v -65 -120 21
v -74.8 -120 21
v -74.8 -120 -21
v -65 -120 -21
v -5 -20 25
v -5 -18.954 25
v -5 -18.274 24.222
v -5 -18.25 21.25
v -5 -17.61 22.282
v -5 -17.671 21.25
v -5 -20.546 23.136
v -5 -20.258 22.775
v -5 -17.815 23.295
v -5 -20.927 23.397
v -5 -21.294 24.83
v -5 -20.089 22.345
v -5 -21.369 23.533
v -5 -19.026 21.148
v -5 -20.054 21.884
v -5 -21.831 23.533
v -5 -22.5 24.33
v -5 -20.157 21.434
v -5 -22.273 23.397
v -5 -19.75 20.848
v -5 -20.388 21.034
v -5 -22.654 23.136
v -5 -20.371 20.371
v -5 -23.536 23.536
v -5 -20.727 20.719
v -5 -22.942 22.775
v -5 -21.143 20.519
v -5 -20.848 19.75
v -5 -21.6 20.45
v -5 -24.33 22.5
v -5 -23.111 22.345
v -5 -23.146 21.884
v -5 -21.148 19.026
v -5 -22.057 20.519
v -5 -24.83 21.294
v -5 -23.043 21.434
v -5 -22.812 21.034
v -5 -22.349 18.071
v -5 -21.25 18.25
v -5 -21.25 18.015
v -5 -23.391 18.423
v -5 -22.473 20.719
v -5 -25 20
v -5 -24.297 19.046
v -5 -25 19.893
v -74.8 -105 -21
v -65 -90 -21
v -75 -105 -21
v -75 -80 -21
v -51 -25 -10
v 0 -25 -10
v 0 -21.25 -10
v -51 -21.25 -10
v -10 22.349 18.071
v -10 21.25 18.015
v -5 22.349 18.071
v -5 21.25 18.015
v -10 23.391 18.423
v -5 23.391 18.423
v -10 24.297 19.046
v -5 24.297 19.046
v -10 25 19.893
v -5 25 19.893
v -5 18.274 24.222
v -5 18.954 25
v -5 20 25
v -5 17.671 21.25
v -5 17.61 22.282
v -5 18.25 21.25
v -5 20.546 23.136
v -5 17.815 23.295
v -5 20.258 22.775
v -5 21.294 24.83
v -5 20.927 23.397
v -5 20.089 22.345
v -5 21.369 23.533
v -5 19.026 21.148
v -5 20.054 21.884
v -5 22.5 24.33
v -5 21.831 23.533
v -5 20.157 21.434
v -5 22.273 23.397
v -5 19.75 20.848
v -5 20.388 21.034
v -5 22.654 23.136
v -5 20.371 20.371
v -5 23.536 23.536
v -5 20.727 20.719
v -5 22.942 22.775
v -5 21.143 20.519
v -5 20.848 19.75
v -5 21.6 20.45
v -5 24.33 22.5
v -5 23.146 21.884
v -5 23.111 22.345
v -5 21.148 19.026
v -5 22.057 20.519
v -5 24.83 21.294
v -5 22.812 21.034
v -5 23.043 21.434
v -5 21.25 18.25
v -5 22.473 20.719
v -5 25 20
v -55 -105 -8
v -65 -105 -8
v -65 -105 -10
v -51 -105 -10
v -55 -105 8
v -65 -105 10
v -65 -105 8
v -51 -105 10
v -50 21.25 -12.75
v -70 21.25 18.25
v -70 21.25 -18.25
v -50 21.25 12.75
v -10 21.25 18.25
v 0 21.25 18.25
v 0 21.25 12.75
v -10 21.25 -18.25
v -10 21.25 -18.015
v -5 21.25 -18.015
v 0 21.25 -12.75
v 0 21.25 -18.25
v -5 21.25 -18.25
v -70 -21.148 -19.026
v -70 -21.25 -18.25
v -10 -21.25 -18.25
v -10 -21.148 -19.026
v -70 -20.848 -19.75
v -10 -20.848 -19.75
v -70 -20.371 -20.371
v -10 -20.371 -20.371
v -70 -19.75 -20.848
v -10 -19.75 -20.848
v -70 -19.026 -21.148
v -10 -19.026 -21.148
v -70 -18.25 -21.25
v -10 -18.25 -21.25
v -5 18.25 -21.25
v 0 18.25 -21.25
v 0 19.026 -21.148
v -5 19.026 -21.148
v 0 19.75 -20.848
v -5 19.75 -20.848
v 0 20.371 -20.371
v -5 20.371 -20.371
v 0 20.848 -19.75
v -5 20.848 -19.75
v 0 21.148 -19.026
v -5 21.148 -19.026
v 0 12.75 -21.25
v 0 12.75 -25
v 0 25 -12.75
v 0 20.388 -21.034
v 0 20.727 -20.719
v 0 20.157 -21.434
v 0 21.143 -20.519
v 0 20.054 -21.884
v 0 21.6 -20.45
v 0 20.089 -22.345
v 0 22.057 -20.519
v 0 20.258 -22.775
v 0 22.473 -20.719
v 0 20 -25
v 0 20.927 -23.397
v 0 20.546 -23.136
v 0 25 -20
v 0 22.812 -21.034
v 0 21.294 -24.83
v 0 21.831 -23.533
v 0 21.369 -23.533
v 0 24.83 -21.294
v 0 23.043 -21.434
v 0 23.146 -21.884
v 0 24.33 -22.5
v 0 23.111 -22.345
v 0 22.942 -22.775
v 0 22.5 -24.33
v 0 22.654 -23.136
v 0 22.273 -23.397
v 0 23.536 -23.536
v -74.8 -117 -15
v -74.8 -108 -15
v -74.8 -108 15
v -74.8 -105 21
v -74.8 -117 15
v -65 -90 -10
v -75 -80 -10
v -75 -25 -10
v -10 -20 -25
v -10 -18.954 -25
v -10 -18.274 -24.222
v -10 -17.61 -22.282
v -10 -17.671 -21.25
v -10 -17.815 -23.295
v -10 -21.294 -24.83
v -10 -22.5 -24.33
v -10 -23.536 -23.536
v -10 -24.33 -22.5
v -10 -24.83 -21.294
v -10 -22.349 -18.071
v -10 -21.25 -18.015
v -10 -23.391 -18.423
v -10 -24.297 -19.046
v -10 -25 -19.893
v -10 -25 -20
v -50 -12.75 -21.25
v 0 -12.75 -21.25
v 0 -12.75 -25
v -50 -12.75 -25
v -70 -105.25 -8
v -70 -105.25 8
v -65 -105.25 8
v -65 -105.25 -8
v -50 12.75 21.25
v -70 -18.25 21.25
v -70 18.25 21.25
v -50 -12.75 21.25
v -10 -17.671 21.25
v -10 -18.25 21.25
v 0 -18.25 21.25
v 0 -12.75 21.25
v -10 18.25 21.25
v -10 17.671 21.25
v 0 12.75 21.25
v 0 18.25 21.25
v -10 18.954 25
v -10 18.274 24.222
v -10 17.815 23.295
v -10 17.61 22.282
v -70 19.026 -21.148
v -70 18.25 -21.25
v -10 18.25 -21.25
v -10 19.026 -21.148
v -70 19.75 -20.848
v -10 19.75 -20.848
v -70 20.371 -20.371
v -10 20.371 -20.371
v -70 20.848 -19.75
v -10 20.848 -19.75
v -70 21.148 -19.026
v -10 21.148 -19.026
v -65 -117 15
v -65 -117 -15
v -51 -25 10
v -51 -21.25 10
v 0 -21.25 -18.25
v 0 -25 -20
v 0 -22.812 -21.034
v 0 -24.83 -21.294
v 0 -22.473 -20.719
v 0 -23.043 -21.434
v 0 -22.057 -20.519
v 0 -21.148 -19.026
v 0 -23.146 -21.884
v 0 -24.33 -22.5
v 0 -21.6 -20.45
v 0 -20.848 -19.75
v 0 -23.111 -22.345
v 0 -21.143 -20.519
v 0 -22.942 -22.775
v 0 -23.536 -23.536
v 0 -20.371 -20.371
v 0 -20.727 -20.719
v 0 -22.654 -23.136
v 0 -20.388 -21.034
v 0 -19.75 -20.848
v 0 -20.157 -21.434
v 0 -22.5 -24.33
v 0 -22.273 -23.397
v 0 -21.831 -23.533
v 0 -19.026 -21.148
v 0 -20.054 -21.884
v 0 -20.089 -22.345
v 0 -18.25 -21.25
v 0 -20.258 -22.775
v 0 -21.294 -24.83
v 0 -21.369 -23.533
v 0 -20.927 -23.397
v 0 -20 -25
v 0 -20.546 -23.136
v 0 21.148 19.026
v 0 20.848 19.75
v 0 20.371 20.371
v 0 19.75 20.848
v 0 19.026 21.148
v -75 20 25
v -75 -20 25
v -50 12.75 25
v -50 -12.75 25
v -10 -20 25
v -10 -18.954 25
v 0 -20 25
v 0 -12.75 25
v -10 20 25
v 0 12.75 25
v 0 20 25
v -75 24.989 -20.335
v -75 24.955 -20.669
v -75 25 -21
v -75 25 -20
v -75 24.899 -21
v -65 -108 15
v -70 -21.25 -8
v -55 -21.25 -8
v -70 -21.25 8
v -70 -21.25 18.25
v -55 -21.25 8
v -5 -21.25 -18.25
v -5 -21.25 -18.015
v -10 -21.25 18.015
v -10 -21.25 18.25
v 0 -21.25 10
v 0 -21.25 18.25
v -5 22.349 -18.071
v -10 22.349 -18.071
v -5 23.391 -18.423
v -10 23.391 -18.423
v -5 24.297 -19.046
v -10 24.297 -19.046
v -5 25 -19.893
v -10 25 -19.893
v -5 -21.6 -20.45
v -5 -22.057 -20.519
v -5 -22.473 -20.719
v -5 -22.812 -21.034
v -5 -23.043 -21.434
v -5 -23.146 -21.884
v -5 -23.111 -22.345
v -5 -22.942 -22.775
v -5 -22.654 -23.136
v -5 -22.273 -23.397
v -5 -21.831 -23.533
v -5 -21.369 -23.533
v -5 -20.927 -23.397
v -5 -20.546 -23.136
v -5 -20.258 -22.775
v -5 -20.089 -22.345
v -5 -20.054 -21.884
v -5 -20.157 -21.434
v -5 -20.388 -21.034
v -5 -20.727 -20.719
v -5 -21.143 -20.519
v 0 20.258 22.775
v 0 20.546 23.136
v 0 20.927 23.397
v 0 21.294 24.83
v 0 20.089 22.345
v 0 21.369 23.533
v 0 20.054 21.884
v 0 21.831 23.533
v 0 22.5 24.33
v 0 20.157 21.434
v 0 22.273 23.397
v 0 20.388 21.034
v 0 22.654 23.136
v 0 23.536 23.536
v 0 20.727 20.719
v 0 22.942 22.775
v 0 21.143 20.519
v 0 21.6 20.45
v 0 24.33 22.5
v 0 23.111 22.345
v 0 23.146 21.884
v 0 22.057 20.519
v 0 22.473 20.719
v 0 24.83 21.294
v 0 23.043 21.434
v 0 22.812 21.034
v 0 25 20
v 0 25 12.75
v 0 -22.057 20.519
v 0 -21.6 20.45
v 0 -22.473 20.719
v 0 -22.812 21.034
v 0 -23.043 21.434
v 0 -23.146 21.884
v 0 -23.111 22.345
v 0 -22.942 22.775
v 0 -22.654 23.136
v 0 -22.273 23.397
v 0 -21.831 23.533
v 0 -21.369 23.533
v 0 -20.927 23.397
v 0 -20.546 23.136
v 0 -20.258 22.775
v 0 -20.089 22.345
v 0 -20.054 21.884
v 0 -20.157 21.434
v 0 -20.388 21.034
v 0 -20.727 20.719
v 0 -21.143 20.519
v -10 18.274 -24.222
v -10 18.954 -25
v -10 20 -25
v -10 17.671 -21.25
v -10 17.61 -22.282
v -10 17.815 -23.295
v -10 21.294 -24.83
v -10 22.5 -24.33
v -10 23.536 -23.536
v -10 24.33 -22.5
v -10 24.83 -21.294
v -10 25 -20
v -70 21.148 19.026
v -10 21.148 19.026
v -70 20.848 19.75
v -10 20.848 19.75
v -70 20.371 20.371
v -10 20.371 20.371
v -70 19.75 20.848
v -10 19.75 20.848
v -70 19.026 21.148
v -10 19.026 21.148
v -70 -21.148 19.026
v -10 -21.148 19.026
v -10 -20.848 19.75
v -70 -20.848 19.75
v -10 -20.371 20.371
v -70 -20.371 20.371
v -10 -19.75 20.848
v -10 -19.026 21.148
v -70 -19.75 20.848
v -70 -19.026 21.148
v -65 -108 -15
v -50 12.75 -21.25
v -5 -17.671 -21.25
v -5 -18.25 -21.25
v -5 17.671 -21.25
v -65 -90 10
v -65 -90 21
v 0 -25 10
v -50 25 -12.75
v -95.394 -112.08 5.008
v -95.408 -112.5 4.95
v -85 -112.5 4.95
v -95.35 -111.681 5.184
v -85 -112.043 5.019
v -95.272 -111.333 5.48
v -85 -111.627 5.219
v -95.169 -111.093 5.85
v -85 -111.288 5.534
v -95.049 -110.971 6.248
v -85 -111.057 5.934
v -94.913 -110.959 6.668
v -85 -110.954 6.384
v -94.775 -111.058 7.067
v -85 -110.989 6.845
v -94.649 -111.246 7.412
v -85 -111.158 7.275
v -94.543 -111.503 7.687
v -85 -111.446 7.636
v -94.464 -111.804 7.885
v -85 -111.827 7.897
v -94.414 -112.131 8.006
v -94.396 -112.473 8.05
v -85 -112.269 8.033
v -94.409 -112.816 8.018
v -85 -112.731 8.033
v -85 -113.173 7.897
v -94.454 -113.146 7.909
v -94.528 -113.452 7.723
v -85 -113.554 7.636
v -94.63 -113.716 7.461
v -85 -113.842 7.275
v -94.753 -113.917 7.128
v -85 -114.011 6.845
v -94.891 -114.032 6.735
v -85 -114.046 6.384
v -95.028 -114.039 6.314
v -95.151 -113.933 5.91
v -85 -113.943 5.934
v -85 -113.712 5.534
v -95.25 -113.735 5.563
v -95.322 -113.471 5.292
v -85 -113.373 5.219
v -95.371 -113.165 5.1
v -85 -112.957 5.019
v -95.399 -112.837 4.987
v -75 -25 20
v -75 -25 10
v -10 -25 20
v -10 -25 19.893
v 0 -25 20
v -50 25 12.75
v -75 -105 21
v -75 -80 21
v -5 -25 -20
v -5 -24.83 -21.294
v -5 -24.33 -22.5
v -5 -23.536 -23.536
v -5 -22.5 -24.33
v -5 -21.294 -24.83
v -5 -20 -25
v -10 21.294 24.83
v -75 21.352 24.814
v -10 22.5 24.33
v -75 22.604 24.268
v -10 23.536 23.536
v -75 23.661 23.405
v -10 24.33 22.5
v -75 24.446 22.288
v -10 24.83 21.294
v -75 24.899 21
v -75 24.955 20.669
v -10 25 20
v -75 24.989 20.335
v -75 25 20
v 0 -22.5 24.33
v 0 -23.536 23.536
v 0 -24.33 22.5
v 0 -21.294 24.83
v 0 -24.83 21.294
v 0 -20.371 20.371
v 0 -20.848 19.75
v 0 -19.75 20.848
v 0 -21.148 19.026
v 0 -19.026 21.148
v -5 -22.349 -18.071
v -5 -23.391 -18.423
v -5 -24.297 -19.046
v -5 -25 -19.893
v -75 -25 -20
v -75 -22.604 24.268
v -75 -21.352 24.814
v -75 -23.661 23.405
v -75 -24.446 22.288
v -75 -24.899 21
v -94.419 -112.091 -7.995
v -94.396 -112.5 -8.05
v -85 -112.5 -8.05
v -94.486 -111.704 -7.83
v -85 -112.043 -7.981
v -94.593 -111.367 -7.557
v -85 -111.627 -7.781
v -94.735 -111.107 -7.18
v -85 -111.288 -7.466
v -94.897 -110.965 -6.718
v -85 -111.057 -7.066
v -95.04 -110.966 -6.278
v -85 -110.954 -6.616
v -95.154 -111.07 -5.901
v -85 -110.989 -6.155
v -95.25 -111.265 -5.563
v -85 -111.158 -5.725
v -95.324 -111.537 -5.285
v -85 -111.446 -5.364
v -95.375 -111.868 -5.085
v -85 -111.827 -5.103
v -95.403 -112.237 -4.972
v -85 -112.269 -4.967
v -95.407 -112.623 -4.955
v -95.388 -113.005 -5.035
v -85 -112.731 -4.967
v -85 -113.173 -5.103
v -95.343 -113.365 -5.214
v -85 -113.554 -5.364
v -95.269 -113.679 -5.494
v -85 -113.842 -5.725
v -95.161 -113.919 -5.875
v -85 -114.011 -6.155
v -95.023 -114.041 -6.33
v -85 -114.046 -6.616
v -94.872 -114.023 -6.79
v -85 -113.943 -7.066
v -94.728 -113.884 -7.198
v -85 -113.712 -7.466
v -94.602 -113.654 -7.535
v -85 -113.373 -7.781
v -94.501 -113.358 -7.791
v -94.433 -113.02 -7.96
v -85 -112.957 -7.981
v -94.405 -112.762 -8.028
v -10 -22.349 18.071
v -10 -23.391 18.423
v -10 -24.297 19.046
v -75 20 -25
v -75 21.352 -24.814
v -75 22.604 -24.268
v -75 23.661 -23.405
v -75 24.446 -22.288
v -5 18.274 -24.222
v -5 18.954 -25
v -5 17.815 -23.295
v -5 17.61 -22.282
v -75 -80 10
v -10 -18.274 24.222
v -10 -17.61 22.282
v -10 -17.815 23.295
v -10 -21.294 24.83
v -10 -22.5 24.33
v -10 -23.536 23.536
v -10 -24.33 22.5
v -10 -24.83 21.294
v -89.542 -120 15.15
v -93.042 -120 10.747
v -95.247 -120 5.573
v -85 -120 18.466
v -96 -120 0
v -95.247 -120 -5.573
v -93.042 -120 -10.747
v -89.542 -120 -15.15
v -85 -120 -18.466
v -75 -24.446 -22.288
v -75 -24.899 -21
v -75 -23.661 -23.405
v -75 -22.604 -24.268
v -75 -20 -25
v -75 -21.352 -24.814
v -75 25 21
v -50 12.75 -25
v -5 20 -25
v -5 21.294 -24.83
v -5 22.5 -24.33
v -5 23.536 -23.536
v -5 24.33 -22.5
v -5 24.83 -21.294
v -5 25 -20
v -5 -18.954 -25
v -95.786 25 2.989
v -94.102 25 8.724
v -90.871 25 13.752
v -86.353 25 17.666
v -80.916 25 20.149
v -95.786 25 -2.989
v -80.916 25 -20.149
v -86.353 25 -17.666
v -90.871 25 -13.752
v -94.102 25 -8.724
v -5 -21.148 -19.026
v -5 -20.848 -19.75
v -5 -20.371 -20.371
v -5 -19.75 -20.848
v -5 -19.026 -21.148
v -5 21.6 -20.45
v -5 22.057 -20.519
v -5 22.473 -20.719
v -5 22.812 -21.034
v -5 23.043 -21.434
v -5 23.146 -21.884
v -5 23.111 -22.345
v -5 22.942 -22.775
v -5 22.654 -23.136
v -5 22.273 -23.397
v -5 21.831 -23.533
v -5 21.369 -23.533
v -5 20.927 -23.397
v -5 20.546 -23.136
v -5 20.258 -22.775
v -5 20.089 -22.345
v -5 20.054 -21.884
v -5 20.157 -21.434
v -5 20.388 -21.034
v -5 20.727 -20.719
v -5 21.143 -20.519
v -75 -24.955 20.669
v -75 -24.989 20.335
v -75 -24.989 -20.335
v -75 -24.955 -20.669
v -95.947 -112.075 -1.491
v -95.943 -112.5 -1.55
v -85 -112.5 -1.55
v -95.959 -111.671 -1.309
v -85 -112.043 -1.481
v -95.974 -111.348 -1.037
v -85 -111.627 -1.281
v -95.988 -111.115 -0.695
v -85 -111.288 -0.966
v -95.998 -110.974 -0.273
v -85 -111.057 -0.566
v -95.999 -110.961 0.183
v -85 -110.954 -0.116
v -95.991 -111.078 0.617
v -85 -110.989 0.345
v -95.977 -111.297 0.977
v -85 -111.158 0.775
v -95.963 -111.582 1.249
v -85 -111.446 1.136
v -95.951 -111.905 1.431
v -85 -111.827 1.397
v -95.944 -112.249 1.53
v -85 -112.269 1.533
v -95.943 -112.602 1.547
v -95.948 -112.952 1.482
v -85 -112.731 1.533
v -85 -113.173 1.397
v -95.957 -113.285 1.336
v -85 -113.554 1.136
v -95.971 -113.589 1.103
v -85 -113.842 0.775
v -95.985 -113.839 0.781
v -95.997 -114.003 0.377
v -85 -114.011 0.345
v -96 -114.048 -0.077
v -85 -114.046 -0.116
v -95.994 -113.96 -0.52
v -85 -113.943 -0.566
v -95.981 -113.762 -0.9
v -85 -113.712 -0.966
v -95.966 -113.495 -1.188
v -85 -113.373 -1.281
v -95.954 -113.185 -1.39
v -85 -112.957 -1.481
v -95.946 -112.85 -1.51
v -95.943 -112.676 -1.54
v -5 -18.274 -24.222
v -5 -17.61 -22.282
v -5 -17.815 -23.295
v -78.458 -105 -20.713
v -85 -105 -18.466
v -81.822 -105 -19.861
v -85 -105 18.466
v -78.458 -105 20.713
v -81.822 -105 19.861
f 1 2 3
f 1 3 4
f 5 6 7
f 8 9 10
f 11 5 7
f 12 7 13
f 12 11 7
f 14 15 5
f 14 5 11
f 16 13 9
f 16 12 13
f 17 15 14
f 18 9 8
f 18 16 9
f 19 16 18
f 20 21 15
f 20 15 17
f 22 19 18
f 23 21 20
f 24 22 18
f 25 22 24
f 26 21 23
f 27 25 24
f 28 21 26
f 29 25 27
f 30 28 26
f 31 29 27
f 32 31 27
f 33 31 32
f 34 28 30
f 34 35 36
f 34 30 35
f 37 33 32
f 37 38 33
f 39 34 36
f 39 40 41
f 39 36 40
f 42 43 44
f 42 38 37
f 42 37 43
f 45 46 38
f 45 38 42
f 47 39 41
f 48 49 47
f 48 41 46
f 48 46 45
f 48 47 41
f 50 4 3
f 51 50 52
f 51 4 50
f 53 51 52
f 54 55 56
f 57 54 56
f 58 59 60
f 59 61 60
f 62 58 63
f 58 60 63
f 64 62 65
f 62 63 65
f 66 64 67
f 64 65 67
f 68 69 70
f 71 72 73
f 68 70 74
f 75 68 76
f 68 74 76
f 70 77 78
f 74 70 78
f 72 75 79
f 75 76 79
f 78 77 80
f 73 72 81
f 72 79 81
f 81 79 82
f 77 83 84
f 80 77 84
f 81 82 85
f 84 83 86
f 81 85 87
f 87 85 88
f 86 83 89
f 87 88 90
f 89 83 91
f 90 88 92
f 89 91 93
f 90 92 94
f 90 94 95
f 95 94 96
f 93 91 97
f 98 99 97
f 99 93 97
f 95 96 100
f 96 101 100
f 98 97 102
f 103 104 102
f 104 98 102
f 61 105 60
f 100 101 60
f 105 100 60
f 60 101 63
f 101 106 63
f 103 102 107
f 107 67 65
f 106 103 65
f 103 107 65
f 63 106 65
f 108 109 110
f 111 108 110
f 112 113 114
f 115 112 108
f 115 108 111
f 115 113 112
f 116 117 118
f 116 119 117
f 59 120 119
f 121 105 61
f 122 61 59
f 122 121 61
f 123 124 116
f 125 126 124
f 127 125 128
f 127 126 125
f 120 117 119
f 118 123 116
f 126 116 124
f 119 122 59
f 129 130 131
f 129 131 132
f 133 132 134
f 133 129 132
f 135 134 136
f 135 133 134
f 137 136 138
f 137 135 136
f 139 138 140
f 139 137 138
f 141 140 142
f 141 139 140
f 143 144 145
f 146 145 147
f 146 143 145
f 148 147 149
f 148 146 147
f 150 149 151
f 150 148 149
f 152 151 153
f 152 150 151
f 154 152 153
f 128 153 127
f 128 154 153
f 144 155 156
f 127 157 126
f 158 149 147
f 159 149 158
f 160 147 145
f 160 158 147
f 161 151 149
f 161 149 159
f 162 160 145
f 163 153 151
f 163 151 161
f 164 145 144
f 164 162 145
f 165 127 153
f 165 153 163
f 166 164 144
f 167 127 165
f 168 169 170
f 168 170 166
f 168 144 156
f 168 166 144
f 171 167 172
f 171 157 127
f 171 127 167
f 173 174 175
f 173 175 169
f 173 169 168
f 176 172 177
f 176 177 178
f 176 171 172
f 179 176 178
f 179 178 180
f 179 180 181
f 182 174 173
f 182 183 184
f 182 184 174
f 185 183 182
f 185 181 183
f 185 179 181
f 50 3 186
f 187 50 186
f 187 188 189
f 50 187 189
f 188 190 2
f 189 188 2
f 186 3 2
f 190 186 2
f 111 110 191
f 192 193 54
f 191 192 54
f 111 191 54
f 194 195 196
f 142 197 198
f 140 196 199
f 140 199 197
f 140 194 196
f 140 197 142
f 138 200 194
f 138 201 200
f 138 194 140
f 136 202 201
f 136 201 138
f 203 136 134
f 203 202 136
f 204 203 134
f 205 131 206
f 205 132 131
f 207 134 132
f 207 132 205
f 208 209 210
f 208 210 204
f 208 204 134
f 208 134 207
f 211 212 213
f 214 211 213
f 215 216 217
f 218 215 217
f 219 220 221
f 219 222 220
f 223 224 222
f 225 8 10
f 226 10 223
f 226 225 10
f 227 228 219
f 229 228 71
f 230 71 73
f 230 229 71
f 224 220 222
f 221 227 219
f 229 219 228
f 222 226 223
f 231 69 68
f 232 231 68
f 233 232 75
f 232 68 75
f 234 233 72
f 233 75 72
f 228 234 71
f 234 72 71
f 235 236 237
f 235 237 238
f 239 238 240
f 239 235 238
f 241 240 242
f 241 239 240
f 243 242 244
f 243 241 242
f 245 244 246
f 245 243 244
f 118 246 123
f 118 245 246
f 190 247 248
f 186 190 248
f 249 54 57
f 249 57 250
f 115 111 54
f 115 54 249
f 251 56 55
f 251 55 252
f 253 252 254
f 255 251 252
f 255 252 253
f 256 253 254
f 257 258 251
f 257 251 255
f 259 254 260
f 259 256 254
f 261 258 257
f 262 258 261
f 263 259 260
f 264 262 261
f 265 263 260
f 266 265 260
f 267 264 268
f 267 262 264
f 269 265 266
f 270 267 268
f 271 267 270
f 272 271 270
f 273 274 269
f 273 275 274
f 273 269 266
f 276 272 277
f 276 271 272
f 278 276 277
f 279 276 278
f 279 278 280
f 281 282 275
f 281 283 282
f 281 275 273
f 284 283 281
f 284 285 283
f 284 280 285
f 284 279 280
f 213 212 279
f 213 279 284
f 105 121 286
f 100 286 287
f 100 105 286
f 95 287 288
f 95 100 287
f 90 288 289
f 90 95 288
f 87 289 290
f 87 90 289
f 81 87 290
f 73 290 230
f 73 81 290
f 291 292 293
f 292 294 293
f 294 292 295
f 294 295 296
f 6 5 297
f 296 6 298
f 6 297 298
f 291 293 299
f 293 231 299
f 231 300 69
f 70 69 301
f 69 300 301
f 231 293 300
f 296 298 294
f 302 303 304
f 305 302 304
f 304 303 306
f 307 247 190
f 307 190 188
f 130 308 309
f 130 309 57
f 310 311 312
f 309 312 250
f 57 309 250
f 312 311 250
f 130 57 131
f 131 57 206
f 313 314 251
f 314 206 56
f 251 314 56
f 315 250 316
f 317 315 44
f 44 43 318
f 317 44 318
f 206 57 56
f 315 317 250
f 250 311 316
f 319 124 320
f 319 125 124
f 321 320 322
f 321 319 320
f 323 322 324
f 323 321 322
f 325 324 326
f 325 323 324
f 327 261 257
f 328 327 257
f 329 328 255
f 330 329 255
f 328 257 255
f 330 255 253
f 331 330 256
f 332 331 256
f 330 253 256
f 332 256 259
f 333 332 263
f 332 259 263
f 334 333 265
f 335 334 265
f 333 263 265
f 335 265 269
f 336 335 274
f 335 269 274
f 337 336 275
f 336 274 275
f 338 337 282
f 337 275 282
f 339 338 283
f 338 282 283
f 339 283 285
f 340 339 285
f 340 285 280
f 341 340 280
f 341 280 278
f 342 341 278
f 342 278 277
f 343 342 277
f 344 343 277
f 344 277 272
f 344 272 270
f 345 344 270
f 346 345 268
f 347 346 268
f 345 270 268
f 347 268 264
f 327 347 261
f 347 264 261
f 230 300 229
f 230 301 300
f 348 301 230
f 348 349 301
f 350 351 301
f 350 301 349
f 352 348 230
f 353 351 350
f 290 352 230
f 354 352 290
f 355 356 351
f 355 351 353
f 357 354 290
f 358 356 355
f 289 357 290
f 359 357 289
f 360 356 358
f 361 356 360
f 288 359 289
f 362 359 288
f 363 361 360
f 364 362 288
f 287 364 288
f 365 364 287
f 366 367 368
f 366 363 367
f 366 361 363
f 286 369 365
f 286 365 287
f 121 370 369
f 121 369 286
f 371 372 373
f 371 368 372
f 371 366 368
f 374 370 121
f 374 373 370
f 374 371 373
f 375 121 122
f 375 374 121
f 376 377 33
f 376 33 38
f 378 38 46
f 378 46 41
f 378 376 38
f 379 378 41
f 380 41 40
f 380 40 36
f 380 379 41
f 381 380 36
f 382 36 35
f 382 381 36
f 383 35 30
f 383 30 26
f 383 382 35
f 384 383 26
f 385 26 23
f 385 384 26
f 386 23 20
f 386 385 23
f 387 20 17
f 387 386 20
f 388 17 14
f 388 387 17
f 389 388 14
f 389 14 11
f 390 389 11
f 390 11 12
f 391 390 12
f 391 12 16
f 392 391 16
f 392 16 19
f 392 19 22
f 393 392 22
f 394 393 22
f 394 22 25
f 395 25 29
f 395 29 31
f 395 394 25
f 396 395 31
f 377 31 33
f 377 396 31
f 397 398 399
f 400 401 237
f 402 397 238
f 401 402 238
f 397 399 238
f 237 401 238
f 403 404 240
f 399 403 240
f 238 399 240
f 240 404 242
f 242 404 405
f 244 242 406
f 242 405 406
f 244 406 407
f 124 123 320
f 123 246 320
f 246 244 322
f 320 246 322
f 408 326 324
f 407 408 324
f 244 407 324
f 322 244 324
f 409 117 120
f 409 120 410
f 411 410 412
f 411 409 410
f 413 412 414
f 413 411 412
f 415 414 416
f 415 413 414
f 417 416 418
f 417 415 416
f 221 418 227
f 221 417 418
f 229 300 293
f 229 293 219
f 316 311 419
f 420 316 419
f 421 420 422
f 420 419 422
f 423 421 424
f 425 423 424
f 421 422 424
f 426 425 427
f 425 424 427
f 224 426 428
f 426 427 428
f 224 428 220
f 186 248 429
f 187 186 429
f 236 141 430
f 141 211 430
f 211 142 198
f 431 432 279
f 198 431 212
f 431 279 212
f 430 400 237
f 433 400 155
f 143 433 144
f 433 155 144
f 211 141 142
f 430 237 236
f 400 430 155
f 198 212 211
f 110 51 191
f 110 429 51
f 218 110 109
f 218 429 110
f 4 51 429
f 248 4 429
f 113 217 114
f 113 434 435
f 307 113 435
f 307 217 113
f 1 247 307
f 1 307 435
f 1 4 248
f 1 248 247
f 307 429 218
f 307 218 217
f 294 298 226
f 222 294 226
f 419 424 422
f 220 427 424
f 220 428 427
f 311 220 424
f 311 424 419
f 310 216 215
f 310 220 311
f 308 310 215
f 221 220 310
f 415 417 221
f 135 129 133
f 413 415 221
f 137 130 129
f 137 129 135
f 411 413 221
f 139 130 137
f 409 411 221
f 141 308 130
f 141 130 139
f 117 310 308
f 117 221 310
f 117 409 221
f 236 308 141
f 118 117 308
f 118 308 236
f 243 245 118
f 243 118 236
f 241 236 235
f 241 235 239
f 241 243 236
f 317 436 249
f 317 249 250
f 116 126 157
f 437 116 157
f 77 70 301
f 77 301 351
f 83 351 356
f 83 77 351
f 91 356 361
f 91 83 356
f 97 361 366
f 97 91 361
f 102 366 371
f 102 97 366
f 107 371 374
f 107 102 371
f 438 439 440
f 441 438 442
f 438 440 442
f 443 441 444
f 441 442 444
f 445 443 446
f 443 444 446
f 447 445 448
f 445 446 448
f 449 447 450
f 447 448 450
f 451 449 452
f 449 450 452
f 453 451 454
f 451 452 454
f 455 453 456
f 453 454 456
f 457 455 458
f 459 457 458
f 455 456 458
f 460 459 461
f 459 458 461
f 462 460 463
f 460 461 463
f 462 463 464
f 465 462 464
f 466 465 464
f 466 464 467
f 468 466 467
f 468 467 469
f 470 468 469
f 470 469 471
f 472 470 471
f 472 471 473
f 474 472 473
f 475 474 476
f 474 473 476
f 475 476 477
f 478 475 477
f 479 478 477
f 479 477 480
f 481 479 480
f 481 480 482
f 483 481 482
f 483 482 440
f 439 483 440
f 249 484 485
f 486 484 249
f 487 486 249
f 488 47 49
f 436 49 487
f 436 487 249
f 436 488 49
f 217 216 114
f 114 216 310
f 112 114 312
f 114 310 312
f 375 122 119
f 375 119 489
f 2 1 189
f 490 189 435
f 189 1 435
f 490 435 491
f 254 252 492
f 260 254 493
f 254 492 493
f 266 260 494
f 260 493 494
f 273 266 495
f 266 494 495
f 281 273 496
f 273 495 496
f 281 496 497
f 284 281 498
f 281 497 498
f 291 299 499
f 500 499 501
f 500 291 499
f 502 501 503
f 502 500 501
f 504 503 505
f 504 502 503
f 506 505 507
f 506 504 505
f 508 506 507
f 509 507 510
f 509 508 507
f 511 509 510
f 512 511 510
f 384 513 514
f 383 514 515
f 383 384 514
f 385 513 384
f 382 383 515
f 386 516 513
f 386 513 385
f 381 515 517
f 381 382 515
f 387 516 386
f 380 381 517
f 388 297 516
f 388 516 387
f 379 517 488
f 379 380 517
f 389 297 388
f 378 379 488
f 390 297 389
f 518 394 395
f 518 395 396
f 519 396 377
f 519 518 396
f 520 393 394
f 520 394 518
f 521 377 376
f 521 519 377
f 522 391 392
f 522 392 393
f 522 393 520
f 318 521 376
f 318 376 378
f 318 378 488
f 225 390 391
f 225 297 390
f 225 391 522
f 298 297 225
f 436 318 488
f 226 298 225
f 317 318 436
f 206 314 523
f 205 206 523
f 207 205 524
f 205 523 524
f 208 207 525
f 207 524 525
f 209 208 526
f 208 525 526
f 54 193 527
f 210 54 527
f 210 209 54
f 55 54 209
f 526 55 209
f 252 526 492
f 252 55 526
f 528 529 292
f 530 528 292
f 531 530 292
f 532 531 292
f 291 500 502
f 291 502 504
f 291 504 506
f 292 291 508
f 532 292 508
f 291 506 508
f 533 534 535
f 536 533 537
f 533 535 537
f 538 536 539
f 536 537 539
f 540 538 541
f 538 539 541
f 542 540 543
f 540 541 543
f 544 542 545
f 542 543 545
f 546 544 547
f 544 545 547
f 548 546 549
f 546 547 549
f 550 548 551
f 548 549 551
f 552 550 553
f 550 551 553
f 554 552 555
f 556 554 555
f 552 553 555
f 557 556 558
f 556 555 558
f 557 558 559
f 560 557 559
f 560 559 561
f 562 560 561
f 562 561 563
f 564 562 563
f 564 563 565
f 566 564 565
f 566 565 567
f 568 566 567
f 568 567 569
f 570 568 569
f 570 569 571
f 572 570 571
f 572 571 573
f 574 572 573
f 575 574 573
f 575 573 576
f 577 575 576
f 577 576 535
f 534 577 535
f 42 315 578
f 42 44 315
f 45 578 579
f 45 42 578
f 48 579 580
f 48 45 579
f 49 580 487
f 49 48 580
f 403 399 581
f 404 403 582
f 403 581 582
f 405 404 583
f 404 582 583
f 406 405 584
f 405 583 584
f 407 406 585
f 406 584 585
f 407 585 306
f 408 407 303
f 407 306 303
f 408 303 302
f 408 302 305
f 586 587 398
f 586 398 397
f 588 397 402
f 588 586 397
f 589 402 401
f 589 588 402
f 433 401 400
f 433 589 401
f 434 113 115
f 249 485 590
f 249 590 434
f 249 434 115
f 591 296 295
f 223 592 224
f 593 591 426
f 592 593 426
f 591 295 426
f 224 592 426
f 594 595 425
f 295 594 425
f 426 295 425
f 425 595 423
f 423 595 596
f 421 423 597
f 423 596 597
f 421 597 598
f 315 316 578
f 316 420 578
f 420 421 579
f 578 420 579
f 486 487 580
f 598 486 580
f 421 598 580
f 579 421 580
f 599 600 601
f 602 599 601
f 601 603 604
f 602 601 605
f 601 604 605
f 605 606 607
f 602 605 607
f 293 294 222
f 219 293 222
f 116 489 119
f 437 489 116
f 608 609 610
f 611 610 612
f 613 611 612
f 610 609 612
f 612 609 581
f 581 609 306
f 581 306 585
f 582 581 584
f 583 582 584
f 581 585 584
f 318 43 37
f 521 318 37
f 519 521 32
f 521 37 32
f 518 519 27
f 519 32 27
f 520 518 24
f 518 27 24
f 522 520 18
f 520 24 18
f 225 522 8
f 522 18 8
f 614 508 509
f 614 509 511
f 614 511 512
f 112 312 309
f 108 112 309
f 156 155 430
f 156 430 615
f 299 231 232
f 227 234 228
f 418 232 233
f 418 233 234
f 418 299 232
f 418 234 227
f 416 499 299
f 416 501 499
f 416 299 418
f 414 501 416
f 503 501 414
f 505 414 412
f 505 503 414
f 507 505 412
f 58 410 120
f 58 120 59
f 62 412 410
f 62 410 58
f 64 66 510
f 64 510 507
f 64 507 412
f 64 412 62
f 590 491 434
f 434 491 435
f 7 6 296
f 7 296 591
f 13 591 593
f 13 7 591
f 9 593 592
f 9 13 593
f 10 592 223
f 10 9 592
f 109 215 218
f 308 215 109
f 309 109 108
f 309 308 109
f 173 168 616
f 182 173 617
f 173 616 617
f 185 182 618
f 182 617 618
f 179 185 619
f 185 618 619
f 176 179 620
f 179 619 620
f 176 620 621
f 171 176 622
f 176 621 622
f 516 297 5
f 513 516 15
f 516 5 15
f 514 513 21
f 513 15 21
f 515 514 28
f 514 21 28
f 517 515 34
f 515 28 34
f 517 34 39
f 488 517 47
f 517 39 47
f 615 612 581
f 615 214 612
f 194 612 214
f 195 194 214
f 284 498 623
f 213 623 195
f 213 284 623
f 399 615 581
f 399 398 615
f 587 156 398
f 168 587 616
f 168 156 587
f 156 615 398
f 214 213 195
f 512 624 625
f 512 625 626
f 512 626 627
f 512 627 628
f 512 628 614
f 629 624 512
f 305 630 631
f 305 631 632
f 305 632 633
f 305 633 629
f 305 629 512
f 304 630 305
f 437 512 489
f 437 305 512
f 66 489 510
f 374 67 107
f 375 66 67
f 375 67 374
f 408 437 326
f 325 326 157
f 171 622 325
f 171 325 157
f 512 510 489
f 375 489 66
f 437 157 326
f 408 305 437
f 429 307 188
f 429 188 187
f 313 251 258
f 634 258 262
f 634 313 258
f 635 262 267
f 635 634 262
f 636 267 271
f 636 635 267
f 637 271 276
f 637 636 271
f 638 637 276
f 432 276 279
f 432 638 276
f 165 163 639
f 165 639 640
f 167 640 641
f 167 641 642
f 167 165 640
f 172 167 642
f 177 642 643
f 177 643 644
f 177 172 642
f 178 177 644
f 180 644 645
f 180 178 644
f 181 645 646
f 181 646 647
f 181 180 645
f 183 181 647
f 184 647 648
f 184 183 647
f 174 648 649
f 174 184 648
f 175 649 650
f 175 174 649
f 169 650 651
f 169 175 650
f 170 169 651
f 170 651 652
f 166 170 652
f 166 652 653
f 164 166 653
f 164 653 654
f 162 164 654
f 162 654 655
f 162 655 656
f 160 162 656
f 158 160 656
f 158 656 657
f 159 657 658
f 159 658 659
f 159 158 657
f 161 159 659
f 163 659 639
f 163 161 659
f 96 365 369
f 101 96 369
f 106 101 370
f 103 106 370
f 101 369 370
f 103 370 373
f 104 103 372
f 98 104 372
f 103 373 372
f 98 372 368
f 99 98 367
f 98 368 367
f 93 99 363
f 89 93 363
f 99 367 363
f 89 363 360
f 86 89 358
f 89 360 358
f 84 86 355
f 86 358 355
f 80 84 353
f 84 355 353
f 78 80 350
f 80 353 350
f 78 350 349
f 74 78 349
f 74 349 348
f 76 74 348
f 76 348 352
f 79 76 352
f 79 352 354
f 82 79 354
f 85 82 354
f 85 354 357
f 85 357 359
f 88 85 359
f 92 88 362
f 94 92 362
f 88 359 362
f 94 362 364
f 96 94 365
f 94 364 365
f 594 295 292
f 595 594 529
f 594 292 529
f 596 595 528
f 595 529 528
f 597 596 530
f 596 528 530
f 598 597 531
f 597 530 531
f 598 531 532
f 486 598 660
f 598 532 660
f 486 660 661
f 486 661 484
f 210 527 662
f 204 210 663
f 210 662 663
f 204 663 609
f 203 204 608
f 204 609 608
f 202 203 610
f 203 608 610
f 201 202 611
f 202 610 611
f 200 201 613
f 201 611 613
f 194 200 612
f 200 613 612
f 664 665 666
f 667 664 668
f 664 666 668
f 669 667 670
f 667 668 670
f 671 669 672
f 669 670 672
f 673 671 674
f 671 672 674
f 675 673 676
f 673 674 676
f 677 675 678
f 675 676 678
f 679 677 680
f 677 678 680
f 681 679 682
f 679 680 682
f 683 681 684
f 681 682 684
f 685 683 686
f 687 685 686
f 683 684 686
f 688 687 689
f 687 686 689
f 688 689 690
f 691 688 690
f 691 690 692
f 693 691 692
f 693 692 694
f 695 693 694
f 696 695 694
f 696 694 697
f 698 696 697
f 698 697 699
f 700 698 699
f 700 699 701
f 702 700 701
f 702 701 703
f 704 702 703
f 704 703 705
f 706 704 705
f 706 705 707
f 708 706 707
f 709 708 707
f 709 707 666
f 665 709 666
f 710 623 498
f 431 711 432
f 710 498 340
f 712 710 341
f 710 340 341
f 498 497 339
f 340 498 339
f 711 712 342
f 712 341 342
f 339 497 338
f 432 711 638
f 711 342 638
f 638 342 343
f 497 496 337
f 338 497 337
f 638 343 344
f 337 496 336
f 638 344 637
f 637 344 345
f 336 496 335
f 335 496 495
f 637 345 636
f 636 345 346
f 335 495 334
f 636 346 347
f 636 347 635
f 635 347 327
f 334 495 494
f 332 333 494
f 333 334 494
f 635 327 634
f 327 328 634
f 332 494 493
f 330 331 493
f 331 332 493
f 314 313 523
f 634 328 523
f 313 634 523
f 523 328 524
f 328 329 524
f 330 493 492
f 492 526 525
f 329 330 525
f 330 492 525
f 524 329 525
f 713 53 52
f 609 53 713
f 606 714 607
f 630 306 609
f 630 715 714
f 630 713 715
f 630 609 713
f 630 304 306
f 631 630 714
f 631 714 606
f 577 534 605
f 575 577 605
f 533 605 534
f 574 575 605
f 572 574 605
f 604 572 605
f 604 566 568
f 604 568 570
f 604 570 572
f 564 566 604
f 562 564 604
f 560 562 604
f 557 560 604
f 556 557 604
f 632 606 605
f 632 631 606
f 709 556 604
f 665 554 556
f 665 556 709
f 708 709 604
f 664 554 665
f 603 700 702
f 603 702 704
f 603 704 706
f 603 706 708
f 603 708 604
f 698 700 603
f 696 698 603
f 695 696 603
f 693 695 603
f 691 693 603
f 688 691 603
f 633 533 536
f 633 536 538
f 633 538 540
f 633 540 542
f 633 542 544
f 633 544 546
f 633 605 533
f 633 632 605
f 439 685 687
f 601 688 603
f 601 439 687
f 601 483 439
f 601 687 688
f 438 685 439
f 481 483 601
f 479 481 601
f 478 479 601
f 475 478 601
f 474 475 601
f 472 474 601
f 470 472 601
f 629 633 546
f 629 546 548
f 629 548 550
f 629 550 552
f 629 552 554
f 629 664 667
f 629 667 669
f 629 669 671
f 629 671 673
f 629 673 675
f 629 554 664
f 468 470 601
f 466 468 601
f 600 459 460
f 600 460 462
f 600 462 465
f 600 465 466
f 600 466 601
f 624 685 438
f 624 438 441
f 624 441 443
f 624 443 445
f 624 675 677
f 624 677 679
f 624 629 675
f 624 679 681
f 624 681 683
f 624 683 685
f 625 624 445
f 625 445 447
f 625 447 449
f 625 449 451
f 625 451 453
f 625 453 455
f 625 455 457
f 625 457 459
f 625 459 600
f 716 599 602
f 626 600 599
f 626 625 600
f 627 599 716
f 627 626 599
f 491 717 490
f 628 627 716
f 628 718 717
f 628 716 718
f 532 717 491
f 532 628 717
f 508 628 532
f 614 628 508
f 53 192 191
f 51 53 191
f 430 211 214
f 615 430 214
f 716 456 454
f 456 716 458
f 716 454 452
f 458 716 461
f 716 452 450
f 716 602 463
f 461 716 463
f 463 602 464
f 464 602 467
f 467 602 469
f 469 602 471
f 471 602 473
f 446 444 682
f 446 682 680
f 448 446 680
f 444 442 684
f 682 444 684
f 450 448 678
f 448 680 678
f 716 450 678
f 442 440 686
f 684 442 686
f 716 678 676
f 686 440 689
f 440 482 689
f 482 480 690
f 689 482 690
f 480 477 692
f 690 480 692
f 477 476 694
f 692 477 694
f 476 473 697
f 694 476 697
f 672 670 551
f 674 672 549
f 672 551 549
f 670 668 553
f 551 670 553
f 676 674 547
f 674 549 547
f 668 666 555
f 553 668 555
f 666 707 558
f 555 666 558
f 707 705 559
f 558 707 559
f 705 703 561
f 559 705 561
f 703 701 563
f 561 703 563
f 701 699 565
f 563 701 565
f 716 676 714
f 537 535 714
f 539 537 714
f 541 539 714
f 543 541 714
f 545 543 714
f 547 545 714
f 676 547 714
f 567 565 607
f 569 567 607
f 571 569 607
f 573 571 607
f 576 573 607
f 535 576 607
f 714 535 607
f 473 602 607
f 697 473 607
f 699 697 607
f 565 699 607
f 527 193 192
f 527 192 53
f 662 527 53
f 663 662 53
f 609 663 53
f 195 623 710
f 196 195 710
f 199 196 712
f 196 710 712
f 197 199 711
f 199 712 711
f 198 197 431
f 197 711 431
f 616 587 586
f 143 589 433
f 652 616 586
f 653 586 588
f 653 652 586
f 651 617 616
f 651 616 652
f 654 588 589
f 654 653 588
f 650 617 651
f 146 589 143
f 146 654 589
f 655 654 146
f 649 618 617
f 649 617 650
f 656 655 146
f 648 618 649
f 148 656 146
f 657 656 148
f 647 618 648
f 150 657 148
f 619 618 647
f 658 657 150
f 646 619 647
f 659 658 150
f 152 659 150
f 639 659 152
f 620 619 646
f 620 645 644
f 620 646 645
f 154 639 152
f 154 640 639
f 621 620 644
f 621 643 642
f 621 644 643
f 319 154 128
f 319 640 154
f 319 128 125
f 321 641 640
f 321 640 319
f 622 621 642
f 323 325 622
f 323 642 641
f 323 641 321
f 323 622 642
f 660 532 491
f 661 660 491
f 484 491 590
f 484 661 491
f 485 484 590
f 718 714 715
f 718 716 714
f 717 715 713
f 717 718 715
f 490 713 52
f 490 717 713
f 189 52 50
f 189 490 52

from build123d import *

# Parameters (mm, degrees)
SKETCH1_W                = 50
SKETCH1_H                = 50
BOSS_EXTRUDE1_DEPTH      = 75
FILLET1_R                = 5
SKETCH2_W                = 42.5
SKETCH2_H                = 42.5
CUT_EXTRUDE1_DEPTH       = 70
FILLET2_R                = 3
SKETCH3_W                = 25.5
SKETCH3_H                = 3.75
SKETCH3_W_2              = 3.75
SKETCH3_H_2              = 25.5
CUT_EXTRUDE2_DEPTH       = 50
SKETCH4_W                = 20
SKETCH4_H                = 3.75
CUT_EXTRUDE3_DEPTH       = 70
SKETCH8_R                = 1.55
CUT_EXTRUDE5_DEPTH       = 5
SKETCH9_R                = 4
CUT_EXTRUDE6_DEPTH       = 5
MIRROR2_COPY_1_SKETCH_R  = 1.55
MIRROR2_COPY_1_DEPTH     = 5
MIRROR2_COPY_2_SKETCH_R  = 4
MIRROR2_COPY_2_DEPTH     = 5
BOSS_EXTRUDE2_DEPTH      = 25
BOSS_EXTRUDE2_DEPTH_BACK = 120
CUT_EXTRUDE8_DEPTH       = 15
SKETCH12_R               = 1.55
CUT_EXTRUDE9_DEPTH       = 15
SKETCH13_W               = 10
SKETCH13_H               = 42
BOSS_EXTRUDE3_DEPTH      = 15
BOSS_EXTRUDE3_DEPTH_BACK = 15
BOSS_EXTRUDE4_DEPTH      = 42
SKETCH16_W               = 30
SKETCH16_H               = 9
CUT_EXTRUDE10_DEPTH      = 10
SKETCH17_W               = 0.2
SKETCH17_H               = 42
CUT_EXTRUDE11_DEPTH      = 15
SKETCH18_W               = 24
SKETCH18_H               = 20
BOSS_EXTRUDE7_DEPTH      = 80
BOSS_EXTRUDE7_DEPTH_BACK = 3.75
SKETCH19_W               = 15
SKETCH19_H               = 16
CUT_EXTRUDE12_DEPTH      = 84


with BuildPart() as part:
    # Sketch1 → Boss-Extrude1 (new body)
    with BuildSketch(Plane(origin=(0, 0, 0), x_dir=(0, 0, -1), z_dir=(1, 0, 0))):
        Rectangle(SKETCH1_W, SKETCH1_H)
    extrude(amount=-BOSS_EXTRUDE1_DEPTH)

    # Fillet1
    fillet1_edges = [part.edges().sort_by_distance(p)[0] for p in [
        (-37.5, -25, -25),
        (-37.5, -25, 25),
        (-37.5, 25, 25),
        (-37.5, 25, -25),
    ]]
    fillet(fillet1_edges, radius=FILLET1_R)

    # Sketch2 → Cut-Extrude1 (cut)
    with BuildSketch(Plane(origin=(0, 0, 0), x_dir=(0, 0, -1), z_dir=(1, 0, 0))):
        Rectangle(SKETCH2_W, SKETCH2_H)
    extrude(amount=-CUT_EXTRUDE1_DEPTH, mode=Mode.SUBTRACT)

    # Fillet2
    fillet2_edges = [part.edges().sort_by_distance(p)[0] for p in [
        (-35, 21.25, -21.25),
        (-35, -21.25, -21.25),
        (-35, -21.25, 21.25),
        (-35, 21.25, 21.25),
    ]]
    fillet(fillet2_edges, radius=FILLET2_R)

    # Sketch3 → Cut-Extrude2 (cut)
    with BuildSketch(Plane(origin=(0, 0, 0), x_dir=(0, 0, -1), z_dir=(1, 0, 0))):
        with Locations((0, 23.125)):
            Rectangle(SKETCH3_W, SKETCH3_H)
        with Locations((-23.125, 0)):
            Rectangle(SKETCH3_W_2, SKETCH3_H_2)
        with Locations((23.125, 0)):
            Rectangle(SKETCH3_W_2, SKETCH3_H_2)
    extrude(amount=-CUT_EXTRUDE2_DEPTH, mode=Mode.SUBTRACT)

    # Sketch4 → Cut-Extrude3 (cut)
    with BuildSketch(Plane(origin=(0, 0, 0), x_dir=(0, 0, -1), z_dir=(1, 0, 0))):
        with Locations((0, -23.125)):
            Rectangle(SKETCH4_W, SKETCH4_H)
    extrude(amount=-CUT_EXTRUDE3_DEPTH, mode=Mode.SUBTRACT)

    # Sketch8 → Cut-Extrude5 (cut)
    with BuildSketch(Plane(origin=(0, 0, 0), x_dir=(0, 0, -1), z_dir=(1, 0, 0))):
        with Locations((-22, 21.6)):
            Circle(SKETCH8_R)
    cut_extrude5 = extrude(amount=-CUT_EXTRUDE5_DEPTH, mode=Mode.SUBTRACT)

    # Sketch9 → Cut-Extrude6 (cut)
    with BuildSketch(Plane(origin=(-5, 0, 0), x_dir=(0, 0, -1), z_dir=(1, 0, 0))):
        with Locations((-22, 21.6)):
            Circle(SKETCH9_R)
    cut_extrude6 = extrude(amount=-CUT_EXTRUDE6_DEPTH, mode=Mode.SUBTRACT)

    # Mirror1: Cut-Extrude5, Cut-Extrude6 across plane
    add(cut_extrude5.mirror(Plane.ZX), mode=Mode.SUBTRACT)
    add(cut_extrude6.mirror(Plane.ZX), mode=Mode.SUBTRACT)

    # Mirror2: Cut-Extrude5, Cut-Extrude6 across plane
    add(cut_extrude5.mirror(Plane.XY), mode=Mode.SUBTRACT)
    add(cut_extrude6.mirror(Plane.XY), mode=Mode.SUBTRACT)

    # Mirror2 copy 1 sketch → Mirror2 copy 1 (cut)
    with BuildSketch(Plane(origin=(0, 0, 0), x_dir=(0, 0, 1), z_dir=(1, 0, 0))):
        with Locations((-22, 21.6)):
            Circle(MIRROR2_COPY_1_SKETCH_R)
    extrude(amount=-MIRROR2_COPY_1_DEPTH, mode=Mode.SUBTRACT)

    # Mirror2 copy 2 sketch → Mirror2 copy 2 (cut)
    with BuildSketch(Plane(origin=(-5, 0, 0), x_dir=(0, 0, 1), z_dir=(1, 0, 0))):
        with Locations((-22, 21.6)):
            Circle(MIRROR2_COPY_2_SKETCH_R)
    extrude(amount=-MIRROR2_COPY_2_DEPTH, mode=Mode.SUBTRACT)

    # Sketch10 → Boss-Extrude2 (add, two sides)
    with BuildSketch(Plane(origin=(0, 0, 0), x_dir=(1, 0, 0), z_dir=(0, 1, 0))) as boss_extrude2_sk:
        with BuildLine():
            Line((-75, -21), (-75, 21))
            ThreePointArc((-75, 21), (-96, 0), (-75, -21))
        make_face()
    extrude(amount=BOSS_EXTRUDE2_DEPTH)
    extrude(boss_extrude2_sk.sketch, amount=-BOSS_EXTRUDE2_DEPTH_BACK)

    # Sketch11 → Cut-Extrude8 (cut)
    with BuildSketch(Plane.XZ.offset(120)):
        with BuildLine():
            Line((-85, 18.466185313), (-85, -18.466185313))
            ThreePointArc((-85, -18.466185313), (-80.158008745, -20.356692899), (-75, -21))
            Line((-75, -21), (-75, 21))
            ThreePointArc((-75, 21), (-80.158008745, 20.356692899), (-85, 18.466185313))
        make_face()
    extrude(amount=-CUT_EXTRUDE8_DEPTH, mode=Mode.SUBTRACT)

    # Sketch12 → Cut-Extrude9 (cut)
    with BuildSketch(Plane(origin=(-85, 0, 0), x_dir=(0, 0, -1), z_dir=(1, 0, 0))):
        with Locations((0, -112.5)):
            Circle(SKETCH12_R)
        with Locations((-6.5, -112.5)):
            Circle(SKETCH12_R)
        with Locations((6.5, -112.5)):
            Circle(SKETCH12_R)
    extrude(amount=-CUT_EXTRUDE9_DEPTH, mode=Mode.SUBTRACT)



with BuildPart() as body_2:
    # Sketch13 → Boss-Extrude3 (new body, two sides)
    with BuildSketch(Plane.XZ.offset(105)) as boss_extrude3_sk:
        with Locations((-70, 0)):
            Rectangle(SKETCH13_W, SKETCH13_H)
    extrude(amount=BOSS_EXTRUDE3_DEPTH)
    extrude(boss_extrude3_sk.sketch, amount=-BOSS_EXTRUDE3_DEPTH_BACK)


with BuildPart() as part_1:
    add(part.part)

    add(body_2.part)  # Boss-Extrude4 merges body 2
    # Sketch15 → Boss-Extrude4 (add)
    with BuildSketch(Plane.XY.offset(21)):
        Polygon((-65, -90), (-75, -90), (-75, -80), align=None)
    extrude(amount=-BOSS_EXTRUDE4_DEPTH)

    # Sketch16 → Cut-Extrude10 (cut)
    with BuildSketch(Plane(origin=(-65, 0, 0), x_dir=(0, 0, -1), z_dir=(1, 0, 0))):
        with Locations((0, -112.5)):
            Rectangle(SKETCH16_W, SKETCH16_H)
    extrude(amount=-CUT_EXTRUDE10_DEPTH, mode=Mode.SUBTRACT)

    # Sketch17 → Cut-Extrude11 (cut)
    with BuildSketch(Plane.XZ.offset(120)):
        with Locations((-74.9, 0)):
            Rectangle(SKETCH17_W, SKETCH17_H)
    extrude(amount=-CUT_EXTRUDE11_DEPTH, mode=Mode.SUBTRACT)

    # Sketch18 → Boss-Extrude7 (add, two sides)
    with BuildSketch(Plane.XZ.offset(25)) as boss_extrude7_sk:
        with Locations((-63, 0)):
            Rectangle(SKETCH18_W, SKETCH18_H)
    extrude(amount=BOSS_EXTRUDE7_DEPTH)
    extrude(boss_extrude7_sk.sketch, amount=-BOSS_EXTRUDE7_DEPTH_BACK)

    # Sketch19 → Cut-Extrude12 (cut)
    with BuildSketch(Plane(origin=(0, -21.25, 0), x_dir=(1, 0, 0), z_dir=(0, 1, 0))):
        with Locations((-62.5, 0)):
            Rectangle(SKETCH19_W, SKETCH19_H)
    extrude(amount=-CUT_EXTRUDE12_DEPTH, mode=Mode.SUBTRACT)


solid = part_1.part
